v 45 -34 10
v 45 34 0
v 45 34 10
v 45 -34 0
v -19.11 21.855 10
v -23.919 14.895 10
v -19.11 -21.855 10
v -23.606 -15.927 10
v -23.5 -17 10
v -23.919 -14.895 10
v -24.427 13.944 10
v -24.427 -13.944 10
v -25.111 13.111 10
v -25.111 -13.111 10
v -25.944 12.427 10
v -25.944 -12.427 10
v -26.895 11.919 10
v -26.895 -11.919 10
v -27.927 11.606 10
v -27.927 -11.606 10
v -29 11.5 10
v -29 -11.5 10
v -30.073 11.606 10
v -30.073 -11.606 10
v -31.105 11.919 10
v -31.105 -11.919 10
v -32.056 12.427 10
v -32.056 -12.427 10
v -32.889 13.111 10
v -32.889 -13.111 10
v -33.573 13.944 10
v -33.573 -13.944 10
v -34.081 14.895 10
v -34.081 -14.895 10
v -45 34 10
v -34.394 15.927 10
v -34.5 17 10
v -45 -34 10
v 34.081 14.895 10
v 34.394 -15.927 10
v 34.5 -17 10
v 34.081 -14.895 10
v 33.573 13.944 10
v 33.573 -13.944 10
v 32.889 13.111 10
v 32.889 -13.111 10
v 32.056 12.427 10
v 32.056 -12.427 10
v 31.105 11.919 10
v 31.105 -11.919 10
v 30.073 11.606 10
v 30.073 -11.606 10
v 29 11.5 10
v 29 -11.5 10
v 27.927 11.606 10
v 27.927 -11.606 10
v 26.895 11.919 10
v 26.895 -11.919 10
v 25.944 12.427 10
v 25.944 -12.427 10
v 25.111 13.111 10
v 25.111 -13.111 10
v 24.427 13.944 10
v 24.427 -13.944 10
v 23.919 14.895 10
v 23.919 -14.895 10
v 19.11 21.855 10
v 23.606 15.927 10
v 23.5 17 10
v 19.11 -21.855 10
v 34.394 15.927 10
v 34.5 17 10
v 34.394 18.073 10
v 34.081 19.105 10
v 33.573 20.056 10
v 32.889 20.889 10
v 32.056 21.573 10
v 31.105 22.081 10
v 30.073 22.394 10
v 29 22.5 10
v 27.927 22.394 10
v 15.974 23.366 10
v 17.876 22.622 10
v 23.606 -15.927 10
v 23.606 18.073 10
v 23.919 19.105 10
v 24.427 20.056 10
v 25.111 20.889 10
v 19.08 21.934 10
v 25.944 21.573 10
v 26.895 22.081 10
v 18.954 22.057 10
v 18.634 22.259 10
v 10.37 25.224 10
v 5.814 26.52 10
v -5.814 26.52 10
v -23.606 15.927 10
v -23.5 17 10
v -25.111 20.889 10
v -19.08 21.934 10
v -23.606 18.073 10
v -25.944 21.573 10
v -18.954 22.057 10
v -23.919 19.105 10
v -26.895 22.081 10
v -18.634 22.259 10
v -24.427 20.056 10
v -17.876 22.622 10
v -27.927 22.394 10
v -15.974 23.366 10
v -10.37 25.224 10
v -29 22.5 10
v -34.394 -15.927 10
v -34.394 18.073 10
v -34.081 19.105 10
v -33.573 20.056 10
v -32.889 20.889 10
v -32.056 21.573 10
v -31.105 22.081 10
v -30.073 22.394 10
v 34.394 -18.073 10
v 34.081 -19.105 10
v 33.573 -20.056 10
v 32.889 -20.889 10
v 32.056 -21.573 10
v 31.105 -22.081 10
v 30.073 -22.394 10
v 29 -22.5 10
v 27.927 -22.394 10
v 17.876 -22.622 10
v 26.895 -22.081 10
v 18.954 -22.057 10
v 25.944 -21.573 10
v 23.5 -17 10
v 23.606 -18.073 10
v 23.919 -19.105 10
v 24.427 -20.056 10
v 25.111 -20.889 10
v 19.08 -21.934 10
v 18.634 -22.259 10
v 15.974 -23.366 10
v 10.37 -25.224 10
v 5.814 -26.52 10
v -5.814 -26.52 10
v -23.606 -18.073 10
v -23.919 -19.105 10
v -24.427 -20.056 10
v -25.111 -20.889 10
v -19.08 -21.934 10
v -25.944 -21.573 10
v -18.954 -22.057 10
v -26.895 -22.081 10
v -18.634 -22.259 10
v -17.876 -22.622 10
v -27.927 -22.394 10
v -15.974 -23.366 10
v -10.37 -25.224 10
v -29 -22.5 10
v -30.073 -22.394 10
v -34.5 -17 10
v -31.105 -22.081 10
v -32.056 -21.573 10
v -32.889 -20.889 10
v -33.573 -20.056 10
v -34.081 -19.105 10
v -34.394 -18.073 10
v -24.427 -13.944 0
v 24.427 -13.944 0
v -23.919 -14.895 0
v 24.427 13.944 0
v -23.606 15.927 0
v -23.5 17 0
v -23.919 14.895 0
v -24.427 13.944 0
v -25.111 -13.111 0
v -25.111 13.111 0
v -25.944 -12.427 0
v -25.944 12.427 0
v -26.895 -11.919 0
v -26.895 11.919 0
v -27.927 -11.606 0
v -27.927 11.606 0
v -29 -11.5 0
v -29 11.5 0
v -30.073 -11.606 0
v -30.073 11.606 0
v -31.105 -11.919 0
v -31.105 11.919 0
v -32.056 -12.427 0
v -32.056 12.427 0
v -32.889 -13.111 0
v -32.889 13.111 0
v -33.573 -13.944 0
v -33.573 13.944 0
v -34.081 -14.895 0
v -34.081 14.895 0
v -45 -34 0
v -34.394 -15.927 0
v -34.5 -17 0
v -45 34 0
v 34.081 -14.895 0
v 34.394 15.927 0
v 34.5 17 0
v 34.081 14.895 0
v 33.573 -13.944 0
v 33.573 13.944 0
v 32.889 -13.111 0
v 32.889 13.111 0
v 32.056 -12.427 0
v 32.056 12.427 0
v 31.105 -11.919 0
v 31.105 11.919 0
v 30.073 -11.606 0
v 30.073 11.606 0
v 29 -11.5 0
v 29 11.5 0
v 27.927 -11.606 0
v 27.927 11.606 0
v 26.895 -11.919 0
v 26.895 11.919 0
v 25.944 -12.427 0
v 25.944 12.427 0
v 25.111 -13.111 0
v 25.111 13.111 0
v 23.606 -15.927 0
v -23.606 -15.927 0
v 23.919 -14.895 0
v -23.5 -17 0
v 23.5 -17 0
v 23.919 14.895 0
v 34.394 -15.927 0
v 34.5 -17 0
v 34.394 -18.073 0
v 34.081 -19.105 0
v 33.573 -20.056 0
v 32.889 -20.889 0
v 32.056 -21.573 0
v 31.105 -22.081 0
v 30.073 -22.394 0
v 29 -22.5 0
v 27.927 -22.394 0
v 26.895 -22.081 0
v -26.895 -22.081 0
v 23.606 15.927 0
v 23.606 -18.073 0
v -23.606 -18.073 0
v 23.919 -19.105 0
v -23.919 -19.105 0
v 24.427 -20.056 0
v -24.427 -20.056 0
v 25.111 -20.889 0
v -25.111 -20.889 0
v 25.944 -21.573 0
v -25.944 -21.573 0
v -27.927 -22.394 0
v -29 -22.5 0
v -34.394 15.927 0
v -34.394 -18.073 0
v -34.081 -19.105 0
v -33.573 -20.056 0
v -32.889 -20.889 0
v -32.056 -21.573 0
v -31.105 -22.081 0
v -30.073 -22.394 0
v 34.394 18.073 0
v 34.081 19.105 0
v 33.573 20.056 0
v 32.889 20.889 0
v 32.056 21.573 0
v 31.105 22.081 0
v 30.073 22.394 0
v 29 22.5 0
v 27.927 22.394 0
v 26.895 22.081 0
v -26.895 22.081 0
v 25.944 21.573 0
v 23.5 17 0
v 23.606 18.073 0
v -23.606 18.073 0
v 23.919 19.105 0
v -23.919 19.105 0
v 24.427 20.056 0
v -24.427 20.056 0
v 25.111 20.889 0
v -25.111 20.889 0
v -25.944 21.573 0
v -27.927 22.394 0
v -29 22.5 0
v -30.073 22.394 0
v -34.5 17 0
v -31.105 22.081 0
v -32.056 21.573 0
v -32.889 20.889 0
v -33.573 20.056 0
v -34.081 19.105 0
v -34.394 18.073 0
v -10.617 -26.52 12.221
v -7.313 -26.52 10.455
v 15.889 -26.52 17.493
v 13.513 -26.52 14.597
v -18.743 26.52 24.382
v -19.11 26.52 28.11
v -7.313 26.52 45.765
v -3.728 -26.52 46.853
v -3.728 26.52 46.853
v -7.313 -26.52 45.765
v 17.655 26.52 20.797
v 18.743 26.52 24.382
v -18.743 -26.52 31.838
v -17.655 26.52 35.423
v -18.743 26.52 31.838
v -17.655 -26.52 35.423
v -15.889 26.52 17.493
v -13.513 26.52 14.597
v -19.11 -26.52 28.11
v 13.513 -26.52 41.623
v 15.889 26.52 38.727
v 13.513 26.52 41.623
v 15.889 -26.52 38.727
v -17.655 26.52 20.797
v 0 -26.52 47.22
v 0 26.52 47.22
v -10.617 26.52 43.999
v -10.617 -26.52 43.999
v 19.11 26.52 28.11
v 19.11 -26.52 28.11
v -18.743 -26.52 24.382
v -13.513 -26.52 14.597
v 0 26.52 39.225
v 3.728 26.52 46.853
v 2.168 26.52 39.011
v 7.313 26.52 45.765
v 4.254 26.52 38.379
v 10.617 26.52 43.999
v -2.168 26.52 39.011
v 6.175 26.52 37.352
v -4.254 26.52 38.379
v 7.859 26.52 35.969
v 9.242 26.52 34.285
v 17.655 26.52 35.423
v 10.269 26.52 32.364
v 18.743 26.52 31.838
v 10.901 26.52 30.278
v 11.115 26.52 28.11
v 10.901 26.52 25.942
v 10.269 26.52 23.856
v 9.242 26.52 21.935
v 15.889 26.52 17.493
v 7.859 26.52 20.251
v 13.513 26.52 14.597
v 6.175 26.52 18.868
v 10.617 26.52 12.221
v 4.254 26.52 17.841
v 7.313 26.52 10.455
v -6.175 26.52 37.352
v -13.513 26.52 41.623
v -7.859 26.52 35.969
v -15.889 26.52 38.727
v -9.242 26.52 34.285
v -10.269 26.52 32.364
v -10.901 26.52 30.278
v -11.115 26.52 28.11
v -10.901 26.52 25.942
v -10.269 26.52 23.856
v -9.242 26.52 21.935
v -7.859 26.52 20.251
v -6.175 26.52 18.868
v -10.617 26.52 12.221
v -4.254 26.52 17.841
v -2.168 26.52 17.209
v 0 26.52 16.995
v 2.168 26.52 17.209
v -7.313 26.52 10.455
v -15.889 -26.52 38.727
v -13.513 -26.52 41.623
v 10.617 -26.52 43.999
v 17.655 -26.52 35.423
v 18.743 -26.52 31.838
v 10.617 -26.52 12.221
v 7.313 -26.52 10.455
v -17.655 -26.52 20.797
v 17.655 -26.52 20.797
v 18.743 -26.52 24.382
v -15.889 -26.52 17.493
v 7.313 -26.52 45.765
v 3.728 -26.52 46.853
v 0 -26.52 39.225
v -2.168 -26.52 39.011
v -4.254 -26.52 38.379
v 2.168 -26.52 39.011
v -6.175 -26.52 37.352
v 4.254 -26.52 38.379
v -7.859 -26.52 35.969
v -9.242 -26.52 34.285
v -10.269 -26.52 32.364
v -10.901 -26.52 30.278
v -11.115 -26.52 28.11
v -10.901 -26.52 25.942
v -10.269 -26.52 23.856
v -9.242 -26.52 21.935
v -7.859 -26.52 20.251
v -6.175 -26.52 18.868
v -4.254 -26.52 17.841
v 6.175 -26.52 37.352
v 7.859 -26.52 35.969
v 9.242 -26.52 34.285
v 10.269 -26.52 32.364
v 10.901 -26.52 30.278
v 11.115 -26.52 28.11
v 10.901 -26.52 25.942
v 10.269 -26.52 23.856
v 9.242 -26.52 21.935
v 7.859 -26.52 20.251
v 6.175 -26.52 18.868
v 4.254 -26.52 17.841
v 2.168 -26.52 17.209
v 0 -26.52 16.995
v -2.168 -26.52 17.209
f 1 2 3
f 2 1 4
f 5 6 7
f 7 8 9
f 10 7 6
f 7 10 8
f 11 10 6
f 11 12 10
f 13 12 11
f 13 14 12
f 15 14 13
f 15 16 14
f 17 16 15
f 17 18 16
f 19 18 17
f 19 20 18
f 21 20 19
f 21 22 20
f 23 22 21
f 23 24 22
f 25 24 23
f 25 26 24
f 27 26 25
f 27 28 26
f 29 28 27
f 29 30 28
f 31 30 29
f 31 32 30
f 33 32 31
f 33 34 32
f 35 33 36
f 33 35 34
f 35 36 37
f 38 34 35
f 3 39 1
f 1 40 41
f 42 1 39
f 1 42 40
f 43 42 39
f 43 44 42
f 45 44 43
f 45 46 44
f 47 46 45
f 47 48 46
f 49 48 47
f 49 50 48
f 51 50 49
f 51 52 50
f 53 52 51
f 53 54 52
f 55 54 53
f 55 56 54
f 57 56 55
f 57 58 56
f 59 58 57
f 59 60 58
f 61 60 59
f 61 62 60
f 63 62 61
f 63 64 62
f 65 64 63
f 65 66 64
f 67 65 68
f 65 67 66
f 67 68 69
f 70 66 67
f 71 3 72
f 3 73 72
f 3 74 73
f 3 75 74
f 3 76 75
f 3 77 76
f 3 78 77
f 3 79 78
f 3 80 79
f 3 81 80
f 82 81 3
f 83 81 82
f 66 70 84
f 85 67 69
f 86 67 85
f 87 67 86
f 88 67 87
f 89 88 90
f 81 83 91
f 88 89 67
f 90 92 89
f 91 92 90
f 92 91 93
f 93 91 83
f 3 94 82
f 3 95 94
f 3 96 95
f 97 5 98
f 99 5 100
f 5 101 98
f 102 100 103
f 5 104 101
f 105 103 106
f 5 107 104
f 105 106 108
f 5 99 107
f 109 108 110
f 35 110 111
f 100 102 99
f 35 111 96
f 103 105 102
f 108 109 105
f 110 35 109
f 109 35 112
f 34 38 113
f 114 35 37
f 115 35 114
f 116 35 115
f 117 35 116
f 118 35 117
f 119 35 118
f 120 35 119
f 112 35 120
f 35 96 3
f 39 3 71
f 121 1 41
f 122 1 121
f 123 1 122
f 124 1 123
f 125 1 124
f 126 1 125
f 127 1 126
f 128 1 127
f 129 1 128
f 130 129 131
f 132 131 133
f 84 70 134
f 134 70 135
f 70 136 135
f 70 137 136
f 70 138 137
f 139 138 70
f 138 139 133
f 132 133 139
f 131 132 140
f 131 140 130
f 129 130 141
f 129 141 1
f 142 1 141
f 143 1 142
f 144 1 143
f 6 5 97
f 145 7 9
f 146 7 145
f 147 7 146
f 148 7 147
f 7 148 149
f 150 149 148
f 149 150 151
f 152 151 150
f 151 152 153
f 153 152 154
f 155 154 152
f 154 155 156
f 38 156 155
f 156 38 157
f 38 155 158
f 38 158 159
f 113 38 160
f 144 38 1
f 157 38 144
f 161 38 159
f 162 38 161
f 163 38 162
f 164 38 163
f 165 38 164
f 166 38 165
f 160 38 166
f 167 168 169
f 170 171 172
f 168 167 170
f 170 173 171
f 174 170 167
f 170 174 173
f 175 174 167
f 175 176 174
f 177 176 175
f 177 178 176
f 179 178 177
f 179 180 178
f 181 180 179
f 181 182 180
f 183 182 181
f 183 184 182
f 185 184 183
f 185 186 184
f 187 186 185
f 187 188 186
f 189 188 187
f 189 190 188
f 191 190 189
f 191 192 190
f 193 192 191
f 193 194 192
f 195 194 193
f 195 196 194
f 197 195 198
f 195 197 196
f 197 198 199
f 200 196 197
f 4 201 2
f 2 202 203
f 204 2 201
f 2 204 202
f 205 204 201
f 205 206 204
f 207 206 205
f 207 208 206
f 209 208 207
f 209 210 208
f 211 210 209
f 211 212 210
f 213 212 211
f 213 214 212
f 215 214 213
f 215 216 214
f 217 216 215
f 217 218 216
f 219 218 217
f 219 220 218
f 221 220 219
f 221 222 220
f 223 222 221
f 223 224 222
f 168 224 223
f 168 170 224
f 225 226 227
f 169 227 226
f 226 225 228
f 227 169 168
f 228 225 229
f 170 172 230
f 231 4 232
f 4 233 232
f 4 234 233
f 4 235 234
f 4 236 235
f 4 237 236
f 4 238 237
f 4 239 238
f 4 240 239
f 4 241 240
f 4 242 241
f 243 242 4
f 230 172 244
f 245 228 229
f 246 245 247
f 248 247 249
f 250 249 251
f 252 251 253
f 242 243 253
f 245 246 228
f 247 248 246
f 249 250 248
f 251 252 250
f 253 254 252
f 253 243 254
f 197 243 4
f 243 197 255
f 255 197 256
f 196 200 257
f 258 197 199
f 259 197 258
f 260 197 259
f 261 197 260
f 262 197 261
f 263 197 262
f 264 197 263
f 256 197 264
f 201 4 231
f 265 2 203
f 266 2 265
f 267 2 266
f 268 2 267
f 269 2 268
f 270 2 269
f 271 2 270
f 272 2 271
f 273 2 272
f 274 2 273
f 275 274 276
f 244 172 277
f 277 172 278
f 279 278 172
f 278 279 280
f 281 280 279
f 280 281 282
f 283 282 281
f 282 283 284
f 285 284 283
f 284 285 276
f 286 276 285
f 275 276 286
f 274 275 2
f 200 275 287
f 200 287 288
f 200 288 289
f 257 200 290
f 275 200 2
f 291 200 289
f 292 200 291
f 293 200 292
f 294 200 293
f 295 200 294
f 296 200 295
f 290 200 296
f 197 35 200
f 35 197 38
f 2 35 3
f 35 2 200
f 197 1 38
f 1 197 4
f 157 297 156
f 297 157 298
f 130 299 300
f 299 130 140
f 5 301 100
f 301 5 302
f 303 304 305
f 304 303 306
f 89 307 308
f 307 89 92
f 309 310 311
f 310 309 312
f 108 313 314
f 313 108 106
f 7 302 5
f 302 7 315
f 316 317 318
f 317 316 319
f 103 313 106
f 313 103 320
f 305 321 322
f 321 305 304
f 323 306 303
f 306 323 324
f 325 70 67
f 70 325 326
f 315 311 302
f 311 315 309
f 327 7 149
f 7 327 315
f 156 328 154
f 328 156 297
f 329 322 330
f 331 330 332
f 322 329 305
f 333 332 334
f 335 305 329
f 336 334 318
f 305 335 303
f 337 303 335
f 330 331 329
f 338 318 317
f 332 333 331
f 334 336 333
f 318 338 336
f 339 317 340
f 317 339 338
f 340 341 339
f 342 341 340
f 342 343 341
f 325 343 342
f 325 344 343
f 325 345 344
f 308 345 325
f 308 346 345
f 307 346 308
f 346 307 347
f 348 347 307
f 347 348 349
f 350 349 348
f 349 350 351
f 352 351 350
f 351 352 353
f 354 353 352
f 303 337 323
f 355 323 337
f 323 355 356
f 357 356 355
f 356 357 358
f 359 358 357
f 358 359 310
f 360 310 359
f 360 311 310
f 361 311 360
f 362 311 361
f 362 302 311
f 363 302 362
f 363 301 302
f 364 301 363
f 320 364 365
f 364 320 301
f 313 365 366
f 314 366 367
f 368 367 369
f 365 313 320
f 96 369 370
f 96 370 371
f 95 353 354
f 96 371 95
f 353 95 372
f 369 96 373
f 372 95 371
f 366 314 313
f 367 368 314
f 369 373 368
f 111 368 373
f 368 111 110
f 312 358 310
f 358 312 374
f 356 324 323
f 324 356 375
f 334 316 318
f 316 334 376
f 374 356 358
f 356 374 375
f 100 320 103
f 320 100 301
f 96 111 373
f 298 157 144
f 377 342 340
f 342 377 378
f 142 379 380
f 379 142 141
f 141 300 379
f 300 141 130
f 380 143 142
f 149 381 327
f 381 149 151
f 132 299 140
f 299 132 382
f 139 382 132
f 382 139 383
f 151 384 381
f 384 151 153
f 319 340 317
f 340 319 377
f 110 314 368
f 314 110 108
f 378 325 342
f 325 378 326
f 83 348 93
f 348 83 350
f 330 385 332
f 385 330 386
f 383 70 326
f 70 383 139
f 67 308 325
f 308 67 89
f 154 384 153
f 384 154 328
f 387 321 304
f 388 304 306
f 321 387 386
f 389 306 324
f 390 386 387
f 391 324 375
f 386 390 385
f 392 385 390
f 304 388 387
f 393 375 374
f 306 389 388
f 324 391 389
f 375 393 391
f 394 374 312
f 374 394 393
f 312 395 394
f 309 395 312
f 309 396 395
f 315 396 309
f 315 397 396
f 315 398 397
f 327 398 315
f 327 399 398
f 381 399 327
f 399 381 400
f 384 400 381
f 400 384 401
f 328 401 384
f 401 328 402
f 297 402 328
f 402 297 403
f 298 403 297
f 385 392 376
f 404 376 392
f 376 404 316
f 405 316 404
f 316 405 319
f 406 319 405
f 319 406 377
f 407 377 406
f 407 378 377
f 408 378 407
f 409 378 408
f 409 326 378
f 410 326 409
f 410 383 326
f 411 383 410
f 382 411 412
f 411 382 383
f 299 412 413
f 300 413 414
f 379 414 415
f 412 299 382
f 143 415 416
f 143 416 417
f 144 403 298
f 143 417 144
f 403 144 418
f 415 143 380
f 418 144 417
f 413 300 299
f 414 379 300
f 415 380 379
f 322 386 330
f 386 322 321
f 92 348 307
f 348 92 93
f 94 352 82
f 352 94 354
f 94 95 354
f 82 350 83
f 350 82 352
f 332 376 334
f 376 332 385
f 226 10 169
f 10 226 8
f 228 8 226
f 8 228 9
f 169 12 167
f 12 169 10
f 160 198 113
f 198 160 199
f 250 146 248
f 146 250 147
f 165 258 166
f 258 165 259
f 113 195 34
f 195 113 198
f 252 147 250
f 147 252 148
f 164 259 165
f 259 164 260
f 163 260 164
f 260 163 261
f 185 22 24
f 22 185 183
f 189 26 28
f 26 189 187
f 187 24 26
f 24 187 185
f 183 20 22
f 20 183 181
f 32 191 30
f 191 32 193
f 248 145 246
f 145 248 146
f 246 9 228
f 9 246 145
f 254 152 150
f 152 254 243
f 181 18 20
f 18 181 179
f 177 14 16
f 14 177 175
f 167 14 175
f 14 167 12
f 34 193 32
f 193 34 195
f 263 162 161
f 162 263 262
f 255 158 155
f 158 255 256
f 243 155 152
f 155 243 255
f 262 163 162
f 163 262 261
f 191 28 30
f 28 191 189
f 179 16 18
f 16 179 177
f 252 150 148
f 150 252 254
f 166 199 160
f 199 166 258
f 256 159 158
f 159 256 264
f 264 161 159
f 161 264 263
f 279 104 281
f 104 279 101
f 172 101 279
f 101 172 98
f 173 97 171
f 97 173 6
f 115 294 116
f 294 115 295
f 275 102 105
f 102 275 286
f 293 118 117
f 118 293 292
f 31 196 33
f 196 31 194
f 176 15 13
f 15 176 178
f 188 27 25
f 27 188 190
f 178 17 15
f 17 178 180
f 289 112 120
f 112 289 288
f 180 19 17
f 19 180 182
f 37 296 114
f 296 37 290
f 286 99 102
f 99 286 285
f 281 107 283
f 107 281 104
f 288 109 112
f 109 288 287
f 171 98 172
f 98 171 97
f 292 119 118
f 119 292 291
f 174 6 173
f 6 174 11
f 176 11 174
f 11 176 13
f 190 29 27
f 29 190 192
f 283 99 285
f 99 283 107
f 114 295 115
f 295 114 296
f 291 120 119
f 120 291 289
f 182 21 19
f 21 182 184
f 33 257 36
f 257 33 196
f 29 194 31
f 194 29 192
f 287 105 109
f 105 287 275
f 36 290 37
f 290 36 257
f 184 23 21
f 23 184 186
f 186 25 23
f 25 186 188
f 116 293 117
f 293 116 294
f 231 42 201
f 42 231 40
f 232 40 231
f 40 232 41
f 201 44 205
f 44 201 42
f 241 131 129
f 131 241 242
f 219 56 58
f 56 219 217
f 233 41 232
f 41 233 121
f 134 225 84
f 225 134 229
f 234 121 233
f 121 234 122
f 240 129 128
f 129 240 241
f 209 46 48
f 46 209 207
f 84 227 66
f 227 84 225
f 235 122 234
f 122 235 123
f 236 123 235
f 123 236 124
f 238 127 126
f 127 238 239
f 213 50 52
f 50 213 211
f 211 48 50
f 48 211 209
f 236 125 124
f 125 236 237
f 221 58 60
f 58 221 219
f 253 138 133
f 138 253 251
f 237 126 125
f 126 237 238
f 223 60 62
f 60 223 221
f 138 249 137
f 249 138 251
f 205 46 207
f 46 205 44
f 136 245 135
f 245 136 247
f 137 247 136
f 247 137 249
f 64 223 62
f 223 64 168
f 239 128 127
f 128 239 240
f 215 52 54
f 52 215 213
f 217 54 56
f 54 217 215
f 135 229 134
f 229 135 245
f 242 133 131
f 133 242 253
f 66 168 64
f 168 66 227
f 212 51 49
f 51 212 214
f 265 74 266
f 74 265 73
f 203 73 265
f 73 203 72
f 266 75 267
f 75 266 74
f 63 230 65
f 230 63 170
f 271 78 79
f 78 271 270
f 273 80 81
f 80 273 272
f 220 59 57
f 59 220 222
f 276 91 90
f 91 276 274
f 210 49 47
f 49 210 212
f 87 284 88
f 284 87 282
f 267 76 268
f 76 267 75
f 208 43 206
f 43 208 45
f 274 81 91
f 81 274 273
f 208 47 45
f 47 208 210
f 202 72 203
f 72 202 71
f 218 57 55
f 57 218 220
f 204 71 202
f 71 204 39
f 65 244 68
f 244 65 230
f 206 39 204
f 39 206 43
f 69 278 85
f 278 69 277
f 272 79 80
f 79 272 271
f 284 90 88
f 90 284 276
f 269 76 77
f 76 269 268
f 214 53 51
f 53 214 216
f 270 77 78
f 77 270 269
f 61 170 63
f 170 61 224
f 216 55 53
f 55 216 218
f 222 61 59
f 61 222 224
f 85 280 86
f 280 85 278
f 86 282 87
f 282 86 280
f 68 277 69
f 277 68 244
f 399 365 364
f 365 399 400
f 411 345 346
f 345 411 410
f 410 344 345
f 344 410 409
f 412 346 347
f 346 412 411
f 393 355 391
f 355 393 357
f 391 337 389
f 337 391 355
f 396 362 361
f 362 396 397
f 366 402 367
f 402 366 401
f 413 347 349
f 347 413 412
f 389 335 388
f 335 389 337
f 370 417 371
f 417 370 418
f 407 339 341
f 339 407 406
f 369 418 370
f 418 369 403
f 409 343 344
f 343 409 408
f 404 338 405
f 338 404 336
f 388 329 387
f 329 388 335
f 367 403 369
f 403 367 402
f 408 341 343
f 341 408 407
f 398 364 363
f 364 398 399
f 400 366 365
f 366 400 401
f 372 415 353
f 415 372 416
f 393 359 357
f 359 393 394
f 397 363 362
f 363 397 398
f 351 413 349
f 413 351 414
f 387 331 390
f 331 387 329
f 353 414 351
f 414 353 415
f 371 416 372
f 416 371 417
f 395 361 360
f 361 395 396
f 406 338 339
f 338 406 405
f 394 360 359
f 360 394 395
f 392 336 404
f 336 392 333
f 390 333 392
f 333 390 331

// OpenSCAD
$fn = 32;

// ----------------------------------------------------------------------
// Bearing block: 90 x 68 mm base, 22.23 mm bore at 28.11 mm
// ----------------------------------------------------------------------

// --- parameters (mm) ---
base_w = 90;              // base width
base_d = 68;              // base depth
base_t = 10;              // base thickness
bore_d = 22.23;           // shaft / bearing bore
house_r = 19.11;          // housing outer radius
house_len = 53.04;        // housing length along the shaft
foot_w = 38.22;           // foot width under the housing
foot_len = 43.04;         // foot length along the shaft
axis_z = 28.11;           // bore axis height above the base
holes_d = 11;             // mounting holes
hole_x = 29;              // mounting hole spacing

difference() {
  union() {
    /* base plate with its underside on z = 0 */
    translate([0, 0, base_t / 2]) cube([base_w, base_d, base_t], center = true);
    /* hull foot: a straight web blending into the round housing */
    hull() {
      translate([0, 0, base_t - 0.5]) cube([foot_w, foot_len, 1.6], center = true);
      translate([0, 0, axis_z]) rotate([-90, 0, 0]) cylinder(h = house_len, d = 2 * house_r, center = true);
    }
  }
  /* bore through the housing, 2.5 mm clear on both sides */
  translate([0, 0, axis_z]) rotate([-90, 0, 0]) cylinder(h = house_len + 5, d = bore_d, center = true);
  /* mounting holes through the base plate */
  for (hx = [-29, 29]) {
    for (hy = [-17, 17]) {
      translate([hx, hy, -2.5]) cylinder(h = base_t + 5, d = holes_d);
    }
  }
}
